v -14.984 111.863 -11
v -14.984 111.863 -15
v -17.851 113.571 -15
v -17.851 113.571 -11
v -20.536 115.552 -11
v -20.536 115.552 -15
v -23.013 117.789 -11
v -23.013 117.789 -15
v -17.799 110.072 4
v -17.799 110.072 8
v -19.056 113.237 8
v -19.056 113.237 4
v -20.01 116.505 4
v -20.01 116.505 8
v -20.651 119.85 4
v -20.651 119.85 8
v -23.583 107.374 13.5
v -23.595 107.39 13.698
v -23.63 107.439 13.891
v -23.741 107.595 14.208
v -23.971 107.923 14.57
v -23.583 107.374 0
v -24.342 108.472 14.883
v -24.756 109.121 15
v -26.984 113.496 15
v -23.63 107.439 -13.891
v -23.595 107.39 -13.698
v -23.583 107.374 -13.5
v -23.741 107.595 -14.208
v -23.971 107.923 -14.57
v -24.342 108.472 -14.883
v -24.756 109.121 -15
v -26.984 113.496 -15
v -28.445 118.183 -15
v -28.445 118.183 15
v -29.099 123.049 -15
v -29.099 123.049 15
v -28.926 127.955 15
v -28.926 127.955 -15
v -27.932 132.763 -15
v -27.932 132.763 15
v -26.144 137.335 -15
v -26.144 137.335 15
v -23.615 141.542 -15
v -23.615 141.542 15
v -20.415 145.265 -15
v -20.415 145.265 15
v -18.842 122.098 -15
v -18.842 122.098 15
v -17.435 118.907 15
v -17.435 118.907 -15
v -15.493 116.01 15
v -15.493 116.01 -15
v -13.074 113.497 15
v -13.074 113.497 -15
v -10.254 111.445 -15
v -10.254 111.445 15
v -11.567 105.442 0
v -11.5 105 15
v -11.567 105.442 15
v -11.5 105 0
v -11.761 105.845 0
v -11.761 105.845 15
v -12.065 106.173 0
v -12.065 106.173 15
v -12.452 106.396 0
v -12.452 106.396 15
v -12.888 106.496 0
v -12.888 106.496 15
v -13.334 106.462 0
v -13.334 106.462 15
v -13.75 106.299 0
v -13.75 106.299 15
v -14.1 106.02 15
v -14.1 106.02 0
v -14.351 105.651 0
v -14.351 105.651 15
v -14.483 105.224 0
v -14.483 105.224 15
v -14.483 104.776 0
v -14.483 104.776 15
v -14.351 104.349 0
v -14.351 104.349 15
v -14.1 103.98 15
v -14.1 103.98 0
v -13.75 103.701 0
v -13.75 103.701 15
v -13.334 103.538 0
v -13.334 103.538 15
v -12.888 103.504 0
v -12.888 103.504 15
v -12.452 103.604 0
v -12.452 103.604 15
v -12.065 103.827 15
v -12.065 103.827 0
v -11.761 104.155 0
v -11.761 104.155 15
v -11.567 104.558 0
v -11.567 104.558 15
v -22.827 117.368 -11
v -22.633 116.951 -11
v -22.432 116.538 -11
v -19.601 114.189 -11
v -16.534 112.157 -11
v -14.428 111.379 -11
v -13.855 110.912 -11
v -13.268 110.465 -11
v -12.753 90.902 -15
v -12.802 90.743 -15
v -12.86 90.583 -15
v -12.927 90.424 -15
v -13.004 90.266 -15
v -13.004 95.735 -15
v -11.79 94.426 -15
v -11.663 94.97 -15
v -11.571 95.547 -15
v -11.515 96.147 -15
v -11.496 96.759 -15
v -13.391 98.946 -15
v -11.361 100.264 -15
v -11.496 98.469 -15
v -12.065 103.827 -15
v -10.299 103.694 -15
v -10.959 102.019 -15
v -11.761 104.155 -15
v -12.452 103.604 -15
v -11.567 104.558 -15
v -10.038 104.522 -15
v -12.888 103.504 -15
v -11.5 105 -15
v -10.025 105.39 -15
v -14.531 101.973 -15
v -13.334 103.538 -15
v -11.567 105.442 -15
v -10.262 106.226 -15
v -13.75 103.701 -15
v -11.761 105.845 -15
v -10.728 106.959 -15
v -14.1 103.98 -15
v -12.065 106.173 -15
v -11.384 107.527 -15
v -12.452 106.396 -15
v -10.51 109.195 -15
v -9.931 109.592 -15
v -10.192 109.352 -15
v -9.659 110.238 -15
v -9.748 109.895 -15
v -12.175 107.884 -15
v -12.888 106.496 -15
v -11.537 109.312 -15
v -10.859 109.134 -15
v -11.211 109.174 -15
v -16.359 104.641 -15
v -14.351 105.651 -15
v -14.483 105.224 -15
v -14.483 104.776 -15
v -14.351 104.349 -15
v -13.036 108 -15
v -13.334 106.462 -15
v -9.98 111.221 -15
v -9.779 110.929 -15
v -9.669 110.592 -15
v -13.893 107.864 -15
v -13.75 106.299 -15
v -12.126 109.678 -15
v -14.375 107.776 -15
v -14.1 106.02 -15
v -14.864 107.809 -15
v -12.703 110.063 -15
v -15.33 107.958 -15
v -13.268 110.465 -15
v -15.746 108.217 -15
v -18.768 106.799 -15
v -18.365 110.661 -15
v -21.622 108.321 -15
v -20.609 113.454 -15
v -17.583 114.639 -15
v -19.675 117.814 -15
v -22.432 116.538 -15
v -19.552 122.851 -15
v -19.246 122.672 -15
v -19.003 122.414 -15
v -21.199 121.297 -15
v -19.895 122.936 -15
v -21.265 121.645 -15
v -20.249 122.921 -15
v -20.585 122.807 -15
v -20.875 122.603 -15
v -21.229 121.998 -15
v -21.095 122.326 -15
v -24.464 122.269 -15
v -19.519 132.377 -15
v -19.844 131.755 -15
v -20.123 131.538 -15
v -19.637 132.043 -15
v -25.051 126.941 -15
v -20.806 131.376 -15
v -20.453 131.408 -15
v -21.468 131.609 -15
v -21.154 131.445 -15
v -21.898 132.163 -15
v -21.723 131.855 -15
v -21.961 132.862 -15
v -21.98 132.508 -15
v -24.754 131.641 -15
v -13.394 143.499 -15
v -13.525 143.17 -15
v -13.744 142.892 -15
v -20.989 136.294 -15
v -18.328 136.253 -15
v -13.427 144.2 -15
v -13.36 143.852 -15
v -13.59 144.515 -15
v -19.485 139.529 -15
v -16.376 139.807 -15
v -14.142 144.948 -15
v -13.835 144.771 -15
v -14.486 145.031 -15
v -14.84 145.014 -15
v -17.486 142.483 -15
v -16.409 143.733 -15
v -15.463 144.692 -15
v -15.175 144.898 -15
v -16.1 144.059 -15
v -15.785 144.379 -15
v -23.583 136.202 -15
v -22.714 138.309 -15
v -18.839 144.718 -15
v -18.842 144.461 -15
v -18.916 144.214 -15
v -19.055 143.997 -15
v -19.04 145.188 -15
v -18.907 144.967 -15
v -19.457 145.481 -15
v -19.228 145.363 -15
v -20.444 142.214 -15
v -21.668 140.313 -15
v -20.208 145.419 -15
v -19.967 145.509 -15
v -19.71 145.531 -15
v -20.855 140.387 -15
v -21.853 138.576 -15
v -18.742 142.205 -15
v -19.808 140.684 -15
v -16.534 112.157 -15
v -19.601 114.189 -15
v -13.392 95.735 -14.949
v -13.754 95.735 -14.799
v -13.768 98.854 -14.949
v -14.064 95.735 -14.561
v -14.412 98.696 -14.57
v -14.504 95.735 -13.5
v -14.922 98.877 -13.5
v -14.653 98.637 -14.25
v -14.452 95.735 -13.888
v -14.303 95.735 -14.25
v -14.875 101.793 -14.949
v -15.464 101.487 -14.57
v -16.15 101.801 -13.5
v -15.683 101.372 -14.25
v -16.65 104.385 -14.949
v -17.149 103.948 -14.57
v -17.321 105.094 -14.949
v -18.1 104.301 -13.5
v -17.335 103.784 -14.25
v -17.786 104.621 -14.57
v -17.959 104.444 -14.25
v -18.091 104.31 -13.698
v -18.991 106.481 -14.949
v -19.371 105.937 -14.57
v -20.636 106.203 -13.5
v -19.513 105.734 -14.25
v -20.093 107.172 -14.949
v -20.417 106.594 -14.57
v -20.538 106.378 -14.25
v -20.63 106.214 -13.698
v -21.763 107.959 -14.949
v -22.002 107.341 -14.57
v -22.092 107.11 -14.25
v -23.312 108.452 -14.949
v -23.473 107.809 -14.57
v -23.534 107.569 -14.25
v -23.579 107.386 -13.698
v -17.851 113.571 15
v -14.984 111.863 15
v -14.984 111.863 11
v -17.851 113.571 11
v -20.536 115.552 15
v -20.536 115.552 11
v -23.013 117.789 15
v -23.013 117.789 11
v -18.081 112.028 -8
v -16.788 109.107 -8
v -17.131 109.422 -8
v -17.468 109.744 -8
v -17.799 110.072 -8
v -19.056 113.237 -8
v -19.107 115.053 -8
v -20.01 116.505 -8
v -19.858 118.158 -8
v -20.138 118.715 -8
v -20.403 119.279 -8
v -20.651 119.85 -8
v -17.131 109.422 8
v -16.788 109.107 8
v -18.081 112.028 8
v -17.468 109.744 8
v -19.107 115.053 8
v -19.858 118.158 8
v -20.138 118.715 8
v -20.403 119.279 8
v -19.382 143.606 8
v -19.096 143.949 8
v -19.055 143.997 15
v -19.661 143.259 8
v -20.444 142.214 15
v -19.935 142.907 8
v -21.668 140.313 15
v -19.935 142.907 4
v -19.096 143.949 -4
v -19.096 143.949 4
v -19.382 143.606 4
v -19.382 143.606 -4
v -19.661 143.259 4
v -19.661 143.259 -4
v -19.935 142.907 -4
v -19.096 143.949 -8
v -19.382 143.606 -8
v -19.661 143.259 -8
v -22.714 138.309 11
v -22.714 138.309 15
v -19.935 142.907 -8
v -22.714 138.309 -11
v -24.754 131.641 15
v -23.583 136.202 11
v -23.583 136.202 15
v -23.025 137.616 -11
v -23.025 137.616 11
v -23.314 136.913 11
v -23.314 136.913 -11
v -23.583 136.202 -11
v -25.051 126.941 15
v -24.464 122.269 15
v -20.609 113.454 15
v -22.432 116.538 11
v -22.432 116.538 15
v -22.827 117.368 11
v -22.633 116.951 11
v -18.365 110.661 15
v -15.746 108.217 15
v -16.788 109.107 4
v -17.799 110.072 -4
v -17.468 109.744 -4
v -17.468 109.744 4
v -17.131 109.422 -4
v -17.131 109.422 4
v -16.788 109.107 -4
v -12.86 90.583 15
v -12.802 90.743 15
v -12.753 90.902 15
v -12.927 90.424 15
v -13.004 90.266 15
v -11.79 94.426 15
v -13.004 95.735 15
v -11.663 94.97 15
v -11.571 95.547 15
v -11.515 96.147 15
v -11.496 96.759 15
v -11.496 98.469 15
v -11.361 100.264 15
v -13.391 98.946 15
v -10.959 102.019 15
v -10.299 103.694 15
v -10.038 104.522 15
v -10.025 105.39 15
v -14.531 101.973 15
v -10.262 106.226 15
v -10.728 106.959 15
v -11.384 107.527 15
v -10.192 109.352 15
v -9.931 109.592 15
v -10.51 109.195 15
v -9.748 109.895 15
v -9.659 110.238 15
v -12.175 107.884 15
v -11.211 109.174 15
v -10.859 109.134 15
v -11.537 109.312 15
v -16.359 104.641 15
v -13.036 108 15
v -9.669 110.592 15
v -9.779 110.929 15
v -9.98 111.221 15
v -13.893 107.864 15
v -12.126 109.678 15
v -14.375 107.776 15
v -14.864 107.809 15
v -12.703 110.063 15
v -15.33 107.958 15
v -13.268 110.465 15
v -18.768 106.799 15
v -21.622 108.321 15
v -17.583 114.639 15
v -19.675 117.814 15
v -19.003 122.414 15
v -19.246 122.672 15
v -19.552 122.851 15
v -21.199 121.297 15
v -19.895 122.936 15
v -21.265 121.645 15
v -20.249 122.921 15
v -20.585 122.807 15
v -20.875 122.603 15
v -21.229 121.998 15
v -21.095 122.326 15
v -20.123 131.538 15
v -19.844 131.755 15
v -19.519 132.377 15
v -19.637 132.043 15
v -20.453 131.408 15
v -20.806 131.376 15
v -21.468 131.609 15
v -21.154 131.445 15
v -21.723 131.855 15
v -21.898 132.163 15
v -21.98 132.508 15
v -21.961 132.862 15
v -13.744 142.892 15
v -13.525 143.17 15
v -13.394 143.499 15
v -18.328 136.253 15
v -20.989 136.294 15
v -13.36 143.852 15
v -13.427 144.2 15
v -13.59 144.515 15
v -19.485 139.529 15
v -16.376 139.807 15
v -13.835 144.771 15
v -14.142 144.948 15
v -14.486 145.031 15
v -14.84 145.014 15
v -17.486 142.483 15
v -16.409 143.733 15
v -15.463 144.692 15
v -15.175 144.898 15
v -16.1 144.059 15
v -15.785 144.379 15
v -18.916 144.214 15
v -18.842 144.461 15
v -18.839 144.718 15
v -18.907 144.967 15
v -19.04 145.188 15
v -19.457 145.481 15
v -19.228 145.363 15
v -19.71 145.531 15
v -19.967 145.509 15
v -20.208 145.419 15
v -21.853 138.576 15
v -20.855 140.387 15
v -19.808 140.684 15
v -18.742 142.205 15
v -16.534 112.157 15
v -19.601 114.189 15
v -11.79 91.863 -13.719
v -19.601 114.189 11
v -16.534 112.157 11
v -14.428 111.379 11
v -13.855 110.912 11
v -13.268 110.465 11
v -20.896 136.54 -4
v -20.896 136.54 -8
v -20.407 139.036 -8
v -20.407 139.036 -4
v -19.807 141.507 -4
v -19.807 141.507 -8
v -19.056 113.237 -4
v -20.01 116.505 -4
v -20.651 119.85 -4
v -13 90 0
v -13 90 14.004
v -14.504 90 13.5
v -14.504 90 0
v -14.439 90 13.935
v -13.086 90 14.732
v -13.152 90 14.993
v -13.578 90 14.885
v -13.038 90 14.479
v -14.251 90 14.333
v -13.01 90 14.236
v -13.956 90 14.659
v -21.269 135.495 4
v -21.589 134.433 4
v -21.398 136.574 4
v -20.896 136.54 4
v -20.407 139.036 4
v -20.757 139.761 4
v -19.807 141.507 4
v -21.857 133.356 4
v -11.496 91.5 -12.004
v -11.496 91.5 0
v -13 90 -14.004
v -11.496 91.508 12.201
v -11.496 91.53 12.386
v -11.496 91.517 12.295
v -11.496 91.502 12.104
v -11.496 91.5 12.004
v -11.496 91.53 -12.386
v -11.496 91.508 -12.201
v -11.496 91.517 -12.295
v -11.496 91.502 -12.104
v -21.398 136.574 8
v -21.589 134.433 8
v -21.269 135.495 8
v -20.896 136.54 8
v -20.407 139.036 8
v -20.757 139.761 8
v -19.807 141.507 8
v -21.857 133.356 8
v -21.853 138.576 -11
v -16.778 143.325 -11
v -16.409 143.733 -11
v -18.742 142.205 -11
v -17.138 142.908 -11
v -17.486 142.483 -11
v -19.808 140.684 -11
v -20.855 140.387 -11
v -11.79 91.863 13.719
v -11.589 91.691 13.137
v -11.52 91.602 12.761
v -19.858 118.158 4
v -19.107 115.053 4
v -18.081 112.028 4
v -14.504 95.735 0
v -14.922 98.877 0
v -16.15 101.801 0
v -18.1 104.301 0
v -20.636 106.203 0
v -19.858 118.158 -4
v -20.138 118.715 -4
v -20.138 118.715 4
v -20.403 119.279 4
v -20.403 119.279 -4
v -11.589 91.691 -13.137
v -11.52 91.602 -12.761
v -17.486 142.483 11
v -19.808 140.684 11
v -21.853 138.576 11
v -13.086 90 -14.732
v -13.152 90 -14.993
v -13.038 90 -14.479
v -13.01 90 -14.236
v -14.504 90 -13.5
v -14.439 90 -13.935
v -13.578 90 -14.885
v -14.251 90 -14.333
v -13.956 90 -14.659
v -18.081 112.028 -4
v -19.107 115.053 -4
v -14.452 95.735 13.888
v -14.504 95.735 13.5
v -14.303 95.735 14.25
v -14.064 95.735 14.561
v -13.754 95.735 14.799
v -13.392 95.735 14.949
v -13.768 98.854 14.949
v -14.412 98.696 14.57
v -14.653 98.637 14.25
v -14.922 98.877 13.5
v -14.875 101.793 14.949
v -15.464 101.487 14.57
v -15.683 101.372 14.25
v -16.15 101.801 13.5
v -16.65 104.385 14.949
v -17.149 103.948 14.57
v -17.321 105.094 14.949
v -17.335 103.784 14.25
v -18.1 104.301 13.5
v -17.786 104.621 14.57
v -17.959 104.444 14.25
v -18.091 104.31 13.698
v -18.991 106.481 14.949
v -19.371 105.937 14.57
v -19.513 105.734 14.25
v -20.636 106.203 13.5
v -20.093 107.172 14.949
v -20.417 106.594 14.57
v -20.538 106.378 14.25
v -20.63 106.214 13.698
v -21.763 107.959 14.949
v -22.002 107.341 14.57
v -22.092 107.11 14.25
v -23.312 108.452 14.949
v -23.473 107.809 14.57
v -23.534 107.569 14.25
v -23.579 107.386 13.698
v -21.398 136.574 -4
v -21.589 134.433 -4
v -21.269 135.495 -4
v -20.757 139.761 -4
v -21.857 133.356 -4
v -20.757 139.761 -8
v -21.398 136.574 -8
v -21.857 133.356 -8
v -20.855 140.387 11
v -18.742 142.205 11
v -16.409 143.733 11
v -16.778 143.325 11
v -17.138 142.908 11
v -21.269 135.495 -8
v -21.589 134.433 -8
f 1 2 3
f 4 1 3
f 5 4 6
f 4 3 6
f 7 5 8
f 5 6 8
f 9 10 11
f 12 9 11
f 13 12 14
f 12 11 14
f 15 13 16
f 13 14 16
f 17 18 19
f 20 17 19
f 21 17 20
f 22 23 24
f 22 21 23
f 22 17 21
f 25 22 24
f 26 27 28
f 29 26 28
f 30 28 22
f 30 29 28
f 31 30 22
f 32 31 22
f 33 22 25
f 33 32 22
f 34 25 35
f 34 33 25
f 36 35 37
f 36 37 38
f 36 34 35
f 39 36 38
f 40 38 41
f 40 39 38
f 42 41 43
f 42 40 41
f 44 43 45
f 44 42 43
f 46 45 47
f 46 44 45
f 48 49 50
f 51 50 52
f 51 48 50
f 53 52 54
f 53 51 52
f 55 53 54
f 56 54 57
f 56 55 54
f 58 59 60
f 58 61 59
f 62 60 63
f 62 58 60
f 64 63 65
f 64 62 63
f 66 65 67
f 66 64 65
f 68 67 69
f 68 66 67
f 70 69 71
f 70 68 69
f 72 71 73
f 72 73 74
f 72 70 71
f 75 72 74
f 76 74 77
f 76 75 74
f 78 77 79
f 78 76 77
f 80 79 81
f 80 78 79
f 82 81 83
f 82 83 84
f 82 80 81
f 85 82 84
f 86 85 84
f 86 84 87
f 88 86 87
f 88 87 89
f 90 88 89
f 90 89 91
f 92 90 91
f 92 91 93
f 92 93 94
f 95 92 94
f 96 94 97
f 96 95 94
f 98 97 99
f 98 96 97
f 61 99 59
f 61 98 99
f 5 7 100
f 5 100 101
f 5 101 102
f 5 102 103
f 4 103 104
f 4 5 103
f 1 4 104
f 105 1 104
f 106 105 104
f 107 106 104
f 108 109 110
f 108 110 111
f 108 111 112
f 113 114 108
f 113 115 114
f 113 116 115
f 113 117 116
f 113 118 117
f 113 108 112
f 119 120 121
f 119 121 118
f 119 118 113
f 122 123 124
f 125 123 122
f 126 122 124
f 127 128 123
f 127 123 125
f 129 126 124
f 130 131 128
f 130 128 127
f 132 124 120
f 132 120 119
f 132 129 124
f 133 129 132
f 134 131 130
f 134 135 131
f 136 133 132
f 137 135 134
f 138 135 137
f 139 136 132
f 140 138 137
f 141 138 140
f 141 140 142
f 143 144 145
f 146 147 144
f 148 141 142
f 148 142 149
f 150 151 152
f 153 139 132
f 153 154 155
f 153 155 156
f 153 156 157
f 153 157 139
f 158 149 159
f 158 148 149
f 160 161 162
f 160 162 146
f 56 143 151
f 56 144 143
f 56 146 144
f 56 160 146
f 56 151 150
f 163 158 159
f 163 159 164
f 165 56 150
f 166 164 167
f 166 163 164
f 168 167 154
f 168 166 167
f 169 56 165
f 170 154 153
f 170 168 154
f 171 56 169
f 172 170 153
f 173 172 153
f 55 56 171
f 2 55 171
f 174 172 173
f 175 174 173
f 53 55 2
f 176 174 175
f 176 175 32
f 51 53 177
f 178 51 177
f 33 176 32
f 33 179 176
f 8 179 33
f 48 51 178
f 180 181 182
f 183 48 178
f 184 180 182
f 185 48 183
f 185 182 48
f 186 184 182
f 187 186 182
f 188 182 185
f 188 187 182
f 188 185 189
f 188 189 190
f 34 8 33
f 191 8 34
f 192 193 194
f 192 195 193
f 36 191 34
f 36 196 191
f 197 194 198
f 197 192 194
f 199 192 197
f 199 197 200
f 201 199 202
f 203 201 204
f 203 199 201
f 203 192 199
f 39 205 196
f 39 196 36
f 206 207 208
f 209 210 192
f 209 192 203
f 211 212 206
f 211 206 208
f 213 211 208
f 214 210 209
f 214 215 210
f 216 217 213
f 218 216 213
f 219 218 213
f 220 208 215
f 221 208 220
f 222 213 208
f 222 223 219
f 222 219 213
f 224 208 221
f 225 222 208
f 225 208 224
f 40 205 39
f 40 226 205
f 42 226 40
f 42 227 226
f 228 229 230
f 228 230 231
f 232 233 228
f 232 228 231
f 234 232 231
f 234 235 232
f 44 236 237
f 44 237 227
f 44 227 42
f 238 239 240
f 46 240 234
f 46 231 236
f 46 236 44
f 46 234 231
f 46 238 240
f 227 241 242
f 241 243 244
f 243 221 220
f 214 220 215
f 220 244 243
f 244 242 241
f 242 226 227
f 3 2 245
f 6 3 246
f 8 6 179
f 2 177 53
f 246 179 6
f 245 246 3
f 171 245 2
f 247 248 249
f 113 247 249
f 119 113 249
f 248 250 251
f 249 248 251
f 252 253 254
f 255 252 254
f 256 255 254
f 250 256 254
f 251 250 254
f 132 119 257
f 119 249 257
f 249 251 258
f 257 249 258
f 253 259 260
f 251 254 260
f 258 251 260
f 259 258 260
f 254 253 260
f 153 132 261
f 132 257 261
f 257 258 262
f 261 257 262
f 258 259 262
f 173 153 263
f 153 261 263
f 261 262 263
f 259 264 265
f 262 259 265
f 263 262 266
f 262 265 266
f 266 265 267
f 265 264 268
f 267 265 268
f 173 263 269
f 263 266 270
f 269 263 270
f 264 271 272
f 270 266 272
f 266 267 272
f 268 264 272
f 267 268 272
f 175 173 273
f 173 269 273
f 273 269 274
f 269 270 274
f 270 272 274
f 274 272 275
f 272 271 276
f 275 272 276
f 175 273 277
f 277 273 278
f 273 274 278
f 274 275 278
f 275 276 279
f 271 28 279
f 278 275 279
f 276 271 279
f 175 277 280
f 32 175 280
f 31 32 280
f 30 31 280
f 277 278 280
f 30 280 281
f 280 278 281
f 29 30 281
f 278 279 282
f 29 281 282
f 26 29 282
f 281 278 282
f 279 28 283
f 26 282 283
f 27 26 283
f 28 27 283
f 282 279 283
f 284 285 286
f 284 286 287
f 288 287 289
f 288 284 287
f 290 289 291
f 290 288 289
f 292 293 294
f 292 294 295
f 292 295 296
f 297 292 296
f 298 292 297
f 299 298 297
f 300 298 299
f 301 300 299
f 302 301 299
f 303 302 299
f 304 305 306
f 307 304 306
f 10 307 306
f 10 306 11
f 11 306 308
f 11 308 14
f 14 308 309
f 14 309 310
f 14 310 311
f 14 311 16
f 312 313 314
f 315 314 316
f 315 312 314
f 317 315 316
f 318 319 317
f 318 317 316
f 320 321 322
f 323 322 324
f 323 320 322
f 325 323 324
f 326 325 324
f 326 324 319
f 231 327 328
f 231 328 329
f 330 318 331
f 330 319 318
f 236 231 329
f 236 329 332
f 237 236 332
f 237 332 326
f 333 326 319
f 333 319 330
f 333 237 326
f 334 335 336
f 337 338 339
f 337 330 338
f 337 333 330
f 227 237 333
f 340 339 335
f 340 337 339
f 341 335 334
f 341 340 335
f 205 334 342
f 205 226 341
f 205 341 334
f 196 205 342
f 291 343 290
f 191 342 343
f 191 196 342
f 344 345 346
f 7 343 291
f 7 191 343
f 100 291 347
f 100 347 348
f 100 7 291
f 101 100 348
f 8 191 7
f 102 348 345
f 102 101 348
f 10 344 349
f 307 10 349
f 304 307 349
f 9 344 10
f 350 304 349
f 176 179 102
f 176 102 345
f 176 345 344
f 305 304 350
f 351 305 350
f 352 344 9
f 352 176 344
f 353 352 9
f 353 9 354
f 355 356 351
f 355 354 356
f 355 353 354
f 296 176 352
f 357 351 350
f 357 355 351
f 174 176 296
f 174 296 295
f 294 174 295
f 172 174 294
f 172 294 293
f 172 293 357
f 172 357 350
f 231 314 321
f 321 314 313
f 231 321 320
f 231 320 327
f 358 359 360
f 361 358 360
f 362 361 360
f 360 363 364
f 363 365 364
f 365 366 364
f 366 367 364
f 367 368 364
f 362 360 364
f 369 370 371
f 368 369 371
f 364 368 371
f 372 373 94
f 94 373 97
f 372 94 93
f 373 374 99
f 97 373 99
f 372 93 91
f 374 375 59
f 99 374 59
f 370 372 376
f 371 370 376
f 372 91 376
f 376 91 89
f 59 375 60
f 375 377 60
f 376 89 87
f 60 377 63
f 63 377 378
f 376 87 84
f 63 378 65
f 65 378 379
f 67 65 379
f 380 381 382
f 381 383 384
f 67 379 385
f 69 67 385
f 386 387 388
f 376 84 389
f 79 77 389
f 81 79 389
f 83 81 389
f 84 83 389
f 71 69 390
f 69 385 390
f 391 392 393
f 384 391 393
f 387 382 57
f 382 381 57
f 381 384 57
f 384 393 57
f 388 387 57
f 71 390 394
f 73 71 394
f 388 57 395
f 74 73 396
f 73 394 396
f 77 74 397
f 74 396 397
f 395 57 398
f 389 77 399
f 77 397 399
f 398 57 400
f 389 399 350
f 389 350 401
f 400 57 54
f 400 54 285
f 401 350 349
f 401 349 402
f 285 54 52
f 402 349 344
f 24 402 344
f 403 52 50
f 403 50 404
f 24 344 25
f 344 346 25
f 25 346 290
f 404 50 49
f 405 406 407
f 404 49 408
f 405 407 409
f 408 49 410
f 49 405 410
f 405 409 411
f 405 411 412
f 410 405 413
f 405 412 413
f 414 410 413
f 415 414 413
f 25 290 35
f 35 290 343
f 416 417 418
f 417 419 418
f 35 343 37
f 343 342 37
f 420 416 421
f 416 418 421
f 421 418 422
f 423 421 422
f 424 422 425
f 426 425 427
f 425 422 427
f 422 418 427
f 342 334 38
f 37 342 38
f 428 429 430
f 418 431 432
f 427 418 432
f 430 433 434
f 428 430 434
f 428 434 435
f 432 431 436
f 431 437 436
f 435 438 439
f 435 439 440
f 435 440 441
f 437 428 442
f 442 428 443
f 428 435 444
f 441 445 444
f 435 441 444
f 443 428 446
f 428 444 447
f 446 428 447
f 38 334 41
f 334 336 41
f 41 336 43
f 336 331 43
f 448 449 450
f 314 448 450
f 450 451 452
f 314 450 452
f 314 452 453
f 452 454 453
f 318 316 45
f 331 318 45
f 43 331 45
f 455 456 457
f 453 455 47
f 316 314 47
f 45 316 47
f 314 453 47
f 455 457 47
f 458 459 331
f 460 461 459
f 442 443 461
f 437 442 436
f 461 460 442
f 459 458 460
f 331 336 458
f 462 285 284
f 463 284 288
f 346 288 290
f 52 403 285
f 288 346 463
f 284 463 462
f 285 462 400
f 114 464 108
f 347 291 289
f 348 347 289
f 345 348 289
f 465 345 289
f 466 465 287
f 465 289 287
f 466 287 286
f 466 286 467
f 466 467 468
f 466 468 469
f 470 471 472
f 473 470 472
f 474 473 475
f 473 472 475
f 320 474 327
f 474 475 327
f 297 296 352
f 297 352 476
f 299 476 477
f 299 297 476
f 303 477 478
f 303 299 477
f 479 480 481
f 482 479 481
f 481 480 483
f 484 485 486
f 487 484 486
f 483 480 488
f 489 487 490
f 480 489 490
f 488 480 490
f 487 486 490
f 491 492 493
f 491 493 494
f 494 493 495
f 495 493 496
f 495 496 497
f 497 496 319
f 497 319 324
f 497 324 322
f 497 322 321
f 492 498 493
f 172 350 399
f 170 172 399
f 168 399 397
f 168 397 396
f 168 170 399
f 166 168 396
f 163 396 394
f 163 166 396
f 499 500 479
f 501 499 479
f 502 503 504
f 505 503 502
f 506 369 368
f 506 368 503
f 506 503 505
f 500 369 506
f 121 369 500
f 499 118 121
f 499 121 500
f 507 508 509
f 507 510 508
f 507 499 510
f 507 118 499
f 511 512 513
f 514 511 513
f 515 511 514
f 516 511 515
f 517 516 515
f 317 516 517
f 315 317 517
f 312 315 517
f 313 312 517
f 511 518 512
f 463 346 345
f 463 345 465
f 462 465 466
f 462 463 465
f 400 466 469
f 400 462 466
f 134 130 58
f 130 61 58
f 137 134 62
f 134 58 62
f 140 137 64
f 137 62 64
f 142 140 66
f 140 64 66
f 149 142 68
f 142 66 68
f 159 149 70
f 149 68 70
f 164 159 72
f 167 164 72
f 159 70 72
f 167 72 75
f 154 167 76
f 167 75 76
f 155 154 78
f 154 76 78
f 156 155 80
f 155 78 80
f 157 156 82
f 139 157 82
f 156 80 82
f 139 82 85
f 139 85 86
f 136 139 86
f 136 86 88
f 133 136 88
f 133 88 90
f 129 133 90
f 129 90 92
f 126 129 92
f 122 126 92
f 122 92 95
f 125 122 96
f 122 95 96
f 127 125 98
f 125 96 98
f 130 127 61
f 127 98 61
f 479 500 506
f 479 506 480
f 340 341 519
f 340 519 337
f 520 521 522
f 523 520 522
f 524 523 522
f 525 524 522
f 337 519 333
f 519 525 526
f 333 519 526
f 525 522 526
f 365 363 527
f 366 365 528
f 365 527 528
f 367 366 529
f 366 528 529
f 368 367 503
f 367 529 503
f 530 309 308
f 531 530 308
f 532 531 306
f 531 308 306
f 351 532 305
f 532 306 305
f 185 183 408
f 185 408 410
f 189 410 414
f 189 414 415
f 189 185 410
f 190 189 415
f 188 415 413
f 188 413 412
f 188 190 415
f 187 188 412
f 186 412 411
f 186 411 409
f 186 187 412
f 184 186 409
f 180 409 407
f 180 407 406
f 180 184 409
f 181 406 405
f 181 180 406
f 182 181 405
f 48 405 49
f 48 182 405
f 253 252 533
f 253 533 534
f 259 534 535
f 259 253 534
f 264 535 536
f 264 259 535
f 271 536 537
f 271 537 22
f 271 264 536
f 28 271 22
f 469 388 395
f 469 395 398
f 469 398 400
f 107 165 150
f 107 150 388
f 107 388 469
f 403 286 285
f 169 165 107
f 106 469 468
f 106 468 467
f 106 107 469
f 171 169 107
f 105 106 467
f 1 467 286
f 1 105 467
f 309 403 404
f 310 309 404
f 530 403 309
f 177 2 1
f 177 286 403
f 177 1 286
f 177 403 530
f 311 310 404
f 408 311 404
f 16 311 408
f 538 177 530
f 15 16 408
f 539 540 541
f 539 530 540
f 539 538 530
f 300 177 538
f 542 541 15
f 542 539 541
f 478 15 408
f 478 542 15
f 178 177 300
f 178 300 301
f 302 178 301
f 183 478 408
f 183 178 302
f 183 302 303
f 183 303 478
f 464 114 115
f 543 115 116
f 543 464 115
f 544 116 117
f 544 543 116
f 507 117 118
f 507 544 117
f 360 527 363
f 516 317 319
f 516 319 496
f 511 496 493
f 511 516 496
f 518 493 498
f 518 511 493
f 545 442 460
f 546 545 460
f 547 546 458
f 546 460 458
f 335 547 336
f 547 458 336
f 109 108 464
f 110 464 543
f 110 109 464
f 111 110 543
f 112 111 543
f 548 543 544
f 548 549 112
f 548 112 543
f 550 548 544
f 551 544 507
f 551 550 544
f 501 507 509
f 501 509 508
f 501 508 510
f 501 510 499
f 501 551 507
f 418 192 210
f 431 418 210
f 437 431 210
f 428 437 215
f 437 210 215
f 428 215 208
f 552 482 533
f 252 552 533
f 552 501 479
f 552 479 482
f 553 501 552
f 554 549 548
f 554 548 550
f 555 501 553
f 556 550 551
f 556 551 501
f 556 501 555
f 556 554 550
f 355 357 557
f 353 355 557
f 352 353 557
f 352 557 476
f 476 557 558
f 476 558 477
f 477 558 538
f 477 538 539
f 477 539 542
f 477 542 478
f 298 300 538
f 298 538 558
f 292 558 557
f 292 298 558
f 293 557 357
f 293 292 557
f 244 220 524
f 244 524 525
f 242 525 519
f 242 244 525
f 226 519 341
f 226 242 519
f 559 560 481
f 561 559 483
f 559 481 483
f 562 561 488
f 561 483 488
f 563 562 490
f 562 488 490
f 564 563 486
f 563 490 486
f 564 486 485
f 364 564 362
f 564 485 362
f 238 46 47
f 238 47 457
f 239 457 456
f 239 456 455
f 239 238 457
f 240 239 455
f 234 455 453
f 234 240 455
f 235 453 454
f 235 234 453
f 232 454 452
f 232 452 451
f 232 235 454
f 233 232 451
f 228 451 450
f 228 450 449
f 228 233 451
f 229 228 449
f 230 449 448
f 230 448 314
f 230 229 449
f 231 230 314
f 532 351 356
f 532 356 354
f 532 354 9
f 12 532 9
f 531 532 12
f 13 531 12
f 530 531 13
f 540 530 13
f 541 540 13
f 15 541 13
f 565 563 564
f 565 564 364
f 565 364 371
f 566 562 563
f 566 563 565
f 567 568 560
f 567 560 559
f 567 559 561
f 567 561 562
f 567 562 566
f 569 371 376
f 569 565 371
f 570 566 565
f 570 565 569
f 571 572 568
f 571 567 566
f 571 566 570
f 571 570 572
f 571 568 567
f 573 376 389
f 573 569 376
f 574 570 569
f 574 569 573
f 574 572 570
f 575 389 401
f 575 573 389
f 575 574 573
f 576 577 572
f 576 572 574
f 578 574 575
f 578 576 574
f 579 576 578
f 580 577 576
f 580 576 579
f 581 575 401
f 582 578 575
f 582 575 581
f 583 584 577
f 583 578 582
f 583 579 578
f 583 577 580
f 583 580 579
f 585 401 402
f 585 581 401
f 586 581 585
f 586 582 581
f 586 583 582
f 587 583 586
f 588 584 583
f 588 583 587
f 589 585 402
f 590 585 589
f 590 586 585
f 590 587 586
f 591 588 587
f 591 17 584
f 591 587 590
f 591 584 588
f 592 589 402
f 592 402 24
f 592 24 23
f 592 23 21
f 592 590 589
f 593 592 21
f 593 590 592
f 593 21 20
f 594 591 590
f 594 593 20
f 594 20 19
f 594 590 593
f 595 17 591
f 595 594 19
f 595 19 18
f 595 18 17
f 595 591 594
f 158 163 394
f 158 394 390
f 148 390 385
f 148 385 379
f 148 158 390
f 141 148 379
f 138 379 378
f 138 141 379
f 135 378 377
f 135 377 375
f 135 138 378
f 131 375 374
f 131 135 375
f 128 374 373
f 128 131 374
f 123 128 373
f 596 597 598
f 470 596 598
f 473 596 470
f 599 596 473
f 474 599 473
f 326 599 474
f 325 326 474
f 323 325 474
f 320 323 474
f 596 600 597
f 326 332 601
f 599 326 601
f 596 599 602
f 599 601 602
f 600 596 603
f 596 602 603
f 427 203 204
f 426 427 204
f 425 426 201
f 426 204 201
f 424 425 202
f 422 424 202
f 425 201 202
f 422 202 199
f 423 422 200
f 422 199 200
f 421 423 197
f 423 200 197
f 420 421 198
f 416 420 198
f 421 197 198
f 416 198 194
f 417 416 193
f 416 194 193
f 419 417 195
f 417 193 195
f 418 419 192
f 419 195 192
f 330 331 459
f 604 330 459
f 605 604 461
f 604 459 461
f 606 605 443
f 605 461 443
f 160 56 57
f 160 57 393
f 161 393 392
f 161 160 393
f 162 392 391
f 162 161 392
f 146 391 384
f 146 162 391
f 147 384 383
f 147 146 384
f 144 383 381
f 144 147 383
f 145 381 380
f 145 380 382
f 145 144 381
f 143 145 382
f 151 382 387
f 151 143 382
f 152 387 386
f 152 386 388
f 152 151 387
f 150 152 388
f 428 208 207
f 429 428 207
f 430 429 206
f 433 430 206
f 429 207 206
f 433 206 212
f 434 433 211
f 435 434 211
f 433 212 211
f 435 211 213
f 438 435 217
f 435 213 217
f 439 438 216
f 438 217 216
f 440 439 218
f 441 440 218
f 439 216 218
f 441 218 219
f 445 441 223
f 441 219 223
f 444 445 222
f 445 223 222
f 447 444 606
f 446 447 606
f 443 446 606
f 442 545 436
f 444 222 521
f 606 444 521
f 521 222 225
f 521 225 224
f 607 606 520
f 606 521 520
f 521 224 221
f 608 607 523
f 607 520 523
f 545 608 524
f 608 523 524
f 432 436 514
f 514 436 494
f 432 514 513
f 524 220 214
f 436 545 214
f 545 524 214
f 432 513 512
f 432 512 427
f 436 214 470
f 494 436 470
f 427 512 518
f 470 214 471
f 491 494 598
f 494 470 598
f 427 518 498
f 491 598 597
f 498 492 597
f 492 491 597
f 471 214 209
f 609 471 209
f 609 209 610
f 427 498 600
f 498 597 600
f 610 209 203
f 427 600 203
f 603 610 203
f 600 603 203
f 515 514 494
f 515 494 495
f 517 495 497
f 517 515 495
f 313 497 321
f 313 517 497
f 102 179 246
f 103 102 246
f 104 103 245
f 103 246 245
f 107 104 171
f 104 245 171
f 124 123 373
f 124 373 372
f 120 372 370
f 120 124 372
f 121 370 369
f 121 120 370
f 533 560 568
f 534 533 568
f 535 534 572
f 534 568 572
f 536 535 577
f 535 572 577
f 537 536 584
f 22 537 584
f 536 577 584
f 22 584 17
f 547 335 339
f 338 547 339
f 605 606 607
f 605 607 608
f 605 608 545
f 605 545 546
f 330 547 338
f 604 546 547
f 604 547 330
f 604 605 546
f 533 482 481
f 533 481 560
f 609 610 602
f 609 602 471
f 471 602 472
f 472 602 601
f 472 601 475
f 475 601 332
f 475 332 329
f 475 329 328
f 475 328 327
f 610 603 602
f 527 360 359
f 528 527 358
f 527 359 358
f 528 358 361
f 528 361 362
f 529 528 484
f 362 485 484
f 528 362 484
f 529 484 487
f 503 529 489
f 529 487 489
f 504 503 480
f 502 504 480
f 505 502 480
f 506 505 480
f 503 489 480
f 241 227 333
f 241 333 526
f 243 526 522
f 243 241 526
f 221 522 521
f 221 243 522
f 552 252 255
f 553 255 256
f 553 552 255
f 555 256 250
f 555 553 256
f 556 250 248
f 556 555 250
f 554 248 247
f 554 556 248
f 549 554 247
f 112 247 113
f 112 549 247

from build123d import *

# Parameters (mm, degrees)
SKETCH4_R             = 1.5
BOSS_EXTRUDE3_DEPTH   = 15
BOSS_EXTRUDE3_2_DEPTH = 15
BOSS_EXTRUDE3_3_DEPTH = 15
BOSS_EXTRUDE23_START  = 15
BOSS_EXTRUDE23_DEPTH  = 4
BOSS_EXTRUDE24_START  = 8
BOSS_EXTRUDE24_DEPTH  = 4
FILLET2_R             = 2
FILLET1_R             = 1.5


# Read off the part's stored shape, not the designer's step: Mirror15
with BuildPart() as part:
    # Sketch4 → Boss-Extrude3 (new, symmetric)
    with BuildSketch(Plane.XY):
        with BuildLine():
            ThreePointArc((-15.745615363, 108.217071894), (-14.863780591, 107.808507644), (-13.893474834, 107.863861505))
            ThreePointArc((-13.893474834, 107.863861505), (-10.727575159, 106.958592694), (-10.299299114, 103.693778456))
            ThreePointArc((-10.299299114, 103.693778456), (-11.193367854, 101.14903756), (-11.496495568, 98.468892279))
            Line((-11.496495568, 98.468892279), (-11.496495568, 91.5))
            Line((-11.496495568, 91.5), (-13, 90))
            Line((-13, 90), (-14.503504432, 90))
            Line((-14.503504432, 90), (-14.503504432, 95.734709942))
            ThreePointArc((-14.503504432, 95.734709942), (-17.04172216, 103.115406131), (-23.582617138, 107.373800002))
            ThreePointArc((-23.582617138, 107.373800002), (-29.032421023, 126.907705171), (-20.414545428, 145.265429262))
            ThreePointArc((-20.414545428, 145.265429262), (-19.127581616, 145.281958408), (-19.054880744, 143.996943368))
            ThreePointArc((-19.054880744, 143.996943368), (-24.95633052, 125.408148717), (-15.745615363, 108.217071894))
        make_face()
        with Locations((-13, 105)):
            Circle(SKETCH4_R, mode=Mode.SUBTRACT)
    extrude(amount=BOSS_EXTRUDE3_DEPTH, both=True)



with BuildPart() as body_2:
    # Sketch4 → Boss-Extrude3 2 (new, symmetric)
    with BuildSketch(Plane.XY):
        with BuildLine():
            ThreePointArc((-15.463298435, 144.692144482), (-19.624699769, 139.278232713), (-21.960734627, 132.861797344))
            ThreePointArc((-21.960734627, 132.861797344), (-20.98224362, 131.398279383), (-19.518725659, 132.37677039))
            ThreePointArc((-19.518725659, 132.37677039), (-17.442455247, 138.079705369), (-13.743797057, 142.891596244))
            ThreePointArc((-13.743797057, 142.891596244), (-13.703273627, 144.651621052), (-15.463298435, 144.692144482))
        make_face()
    extrude(amount=BOSS_EXTRUDE3_2_DEPTH, both=True)


with BuildPart() as body_3:
    # Sketch4 → Boss-Extrude3 3 (new, symmetric)
    with BuildSketch(Plane.XY):
        with BuildLine():
            ThreePointArc((-18.842097465, 122.098018813), (-15.492555186, 116.010374953), (-10.254266127, 111.445381089))
            ThreePointArc((-10.254266127, 111.445381089), (-9.828866365, 109.737058954), (-11.5371885, 109.311659193))
            ThreePointArc((-11.5371885, 109.311659193), (-17.430845593, 114.447784397), (-21.199452745, 121.297059992))
            ThreePointArc((-21.199452745, 121.297059992), (-20.421254515, 122.876217042), (-18.842097465, 122.098018813))
        make_face()
    extrude(amount=BOSS_EXTRUDE3_3_DEPTH, both=True)


with BuildPart() as part_1:
    add(part.part)

    add(body_2.part)  # Boss-Extrude23 merges body 2

    add(body_3.part)  # Boss-Extrude23 merges body 3
    # Sketch81 → Boss-Extrude23 (add)
    with BuildSketch(Plane.XY.offset(BOSS_EXTRUDE23_START)):
        with BuildLine():
            ThreePointArc((-16.40923932, 143.732728133), (-16.959334589, 143.117801193), (-17.486399904, 142.483023987))
            ThreePointArc((-17.486399904, 142.483023987), (-20.86751312, 139.665952099), (-23.582500348, 136.202331891))
            ThreePointArc((-23.582500348, 136.202331891), (-23.172403472, 137.265482274), (-22.71440592, 138.308893232))
            ThreePointArc((-22.71440592, 138.308893232), (-19.828313947, 141.330604813), (-16.40923932, 143.732728133))
        make_face()
        with BuildLine():
            ThreePointArc((-14.984055873, 111.863377416), (-19.218265584, 114.528225057), (-23.012819409, 117.788793427))
            ThreePointArc((-23.012819409, 117.788793427), (-22.730989821, 117.159440449), (-22.431952643, 116.538079158))
            ThreePointArc((-22.431952643, 116.538079158), (-18.094842505, 113.132119318), (-13.268041623, 110.465083507))
            ThreePointArc((-13.268041623, 110.465083507), (-14.143339764, 111.14301058), (-14.984055873, 111.863377416))
        make_face()
    extrude(amount=-BOSS_EXTRUDE23_DEPTH)

    # Sketch81<4> → Boss-Extrude24 (add)
    with BuildSketch(Plane.XY.offset(BOSS_EXTRUDE24_START)):
        with BuildLine():
            ThreePointArc((-20.65110959, 119.849519429), (-20.27231766, 118.99567056), (-19.858240545, 118.158364546))
            ThreePointArc((-19.858240545, 118.158364546), (-18.627716165, 113.52909009), (-16.787605108, 109.106606226))
            ThreePointArc((-16.787605108, 109.106606226), (-17.300236642, 109.582181696), (-17.799401283, 110.071873209))
            ThreePointArc((-17.799401283, 110.071873209), (-19.571385864, 114.859745334), (-20.65110959, 119.849519429))
        make_face()
        with BuildLine():
            ThreePointArc((-19.934917917, 142.906651174), (-21.099885834, 138.172303965), (-21.85680447, 133.355845939))
            ThreePointArc((-21.85680447, 133.355845939), (-21.435815653, 134.965674653), (-20.896432339, 136.539792094))
            ThreePointArc((-20.896432339, 136.539792094), (-20.121005018, 140.27470116), (-19.095815217, 143.948911161))
            ThreePointArc((-19.095815217, 143.948911161), (-19.522323343, 143.433381929), (-19.934917917, 142.906651174))
        make_face()
    extrude(amount=-BOSS_EXTRUDE24_DEPTH)

    # SurfaceCut2: cut with a surface, the side it looks to stays
    # 3DSketch1 → Surface-Fill1: a flat surface bounded by the sketch
    with BuildSketch(Plane(origin=(-13, 90, 15), x_dir=(0.2636894274940136, 0.964607633096421, 0), z_dir=(-0.8532247447444736, 0.2332413063570551, -0.4664826127141099)), mode=Mode.PRIVATE) as surface_fill1_1_region:
        Polygon((0, 0), (5.701800205, 0), (1.843369672, 2.261086868), align=None)
    surface_fill1_1 = surface_fill1_1_region.sketch.faces()[0]
    split(bisect_by=surface_fill1_1, keep=Keep.TOP)

    # Fillet2
    fillet2_edges = [part_1.edges().sort_by_distance(p)[0] for p in [
        (-11.496495568, 93.5, 14),
        (-12.248247784, 90.75, 14),
    ]]
    fillet(fillet2_edges, radius=FILLET2_R)

    # Fillet1
    # the kernel refuses this fillet: 1.5 mm, written as the material it takes off along each edge
    with BuildSketch(Plane(origin=(-14.503504432, 86.25, 15), x_dir=(1, 0, 0), z_dir=(0, 1, 0)), Plane(origin=(-14.503504432, 86.25, -15), x_dir=(0, 0, 1), z_dir=(0, 1, 0))) as fillet1_piece_1:
        with BuildLine():
            CenterArc((FILLET1_R, FILLET1_R), FILLET1_R, 180, 90)
            Line((0, FILLET1_R), (0, 0))
            Line((0, 0), (FILLET1_R, 0))
        make_face()
    extrude(amount=9.484709942, mode=Mode.SUBTRACT)
    with BuildSketch(Plane(origin=(-26.503504432, 95.734709942, 15), x_dir=(1, 0, 0), z_dir=(0, -1, 0))) as fillet1_piece_2:
        with BuildLine():
            CenterArc((12 + FILLET1_R, -FILLET1_R), FILLET1_R, 90, 90)
            Line((12, -FILLET1_R), (12, 0))
            Line((12, 0), (12 + FILLET1_R, 0))
        make_face()
    revolve(axis=Axis((-26.503504432, 95.734709942, 15), (0, 0, 1)), revolution_arc=93.822319642, mode=Mode.SUBTRACT)
    with BuildSketch(Plane(origin=(-26.503504432, 95.734709942, -15), x_dir=(1, 0, 0), z_dir=(0, -1, 0))) as fillet1_piece_3:
        with BuildLine():
            CenterArc((12 + FILLET1_R, FILLET1_R), FILLET1_R, 180, 90)
            Line((12 + FILLET1_R, 0), (12, 0))
            Line((12, 0), (12, FILLET1_R))
        make_face()
    revolve(axis=Axis((-26.503504432, 95.734709942, -15), (0, 0, 1)), revolution_arc=93.822319642, mode=Mode.SUBTRACT)

    # Mirror15
    split(bisect_by=Plane.XY, keep=Keep.TOP)

    # Mirror15 2: part across plane


with BuildPart() as part_2:
    add(part_1.part)
    add(part_1.part.mirror(Plane.XY))


solid = part_2.part
